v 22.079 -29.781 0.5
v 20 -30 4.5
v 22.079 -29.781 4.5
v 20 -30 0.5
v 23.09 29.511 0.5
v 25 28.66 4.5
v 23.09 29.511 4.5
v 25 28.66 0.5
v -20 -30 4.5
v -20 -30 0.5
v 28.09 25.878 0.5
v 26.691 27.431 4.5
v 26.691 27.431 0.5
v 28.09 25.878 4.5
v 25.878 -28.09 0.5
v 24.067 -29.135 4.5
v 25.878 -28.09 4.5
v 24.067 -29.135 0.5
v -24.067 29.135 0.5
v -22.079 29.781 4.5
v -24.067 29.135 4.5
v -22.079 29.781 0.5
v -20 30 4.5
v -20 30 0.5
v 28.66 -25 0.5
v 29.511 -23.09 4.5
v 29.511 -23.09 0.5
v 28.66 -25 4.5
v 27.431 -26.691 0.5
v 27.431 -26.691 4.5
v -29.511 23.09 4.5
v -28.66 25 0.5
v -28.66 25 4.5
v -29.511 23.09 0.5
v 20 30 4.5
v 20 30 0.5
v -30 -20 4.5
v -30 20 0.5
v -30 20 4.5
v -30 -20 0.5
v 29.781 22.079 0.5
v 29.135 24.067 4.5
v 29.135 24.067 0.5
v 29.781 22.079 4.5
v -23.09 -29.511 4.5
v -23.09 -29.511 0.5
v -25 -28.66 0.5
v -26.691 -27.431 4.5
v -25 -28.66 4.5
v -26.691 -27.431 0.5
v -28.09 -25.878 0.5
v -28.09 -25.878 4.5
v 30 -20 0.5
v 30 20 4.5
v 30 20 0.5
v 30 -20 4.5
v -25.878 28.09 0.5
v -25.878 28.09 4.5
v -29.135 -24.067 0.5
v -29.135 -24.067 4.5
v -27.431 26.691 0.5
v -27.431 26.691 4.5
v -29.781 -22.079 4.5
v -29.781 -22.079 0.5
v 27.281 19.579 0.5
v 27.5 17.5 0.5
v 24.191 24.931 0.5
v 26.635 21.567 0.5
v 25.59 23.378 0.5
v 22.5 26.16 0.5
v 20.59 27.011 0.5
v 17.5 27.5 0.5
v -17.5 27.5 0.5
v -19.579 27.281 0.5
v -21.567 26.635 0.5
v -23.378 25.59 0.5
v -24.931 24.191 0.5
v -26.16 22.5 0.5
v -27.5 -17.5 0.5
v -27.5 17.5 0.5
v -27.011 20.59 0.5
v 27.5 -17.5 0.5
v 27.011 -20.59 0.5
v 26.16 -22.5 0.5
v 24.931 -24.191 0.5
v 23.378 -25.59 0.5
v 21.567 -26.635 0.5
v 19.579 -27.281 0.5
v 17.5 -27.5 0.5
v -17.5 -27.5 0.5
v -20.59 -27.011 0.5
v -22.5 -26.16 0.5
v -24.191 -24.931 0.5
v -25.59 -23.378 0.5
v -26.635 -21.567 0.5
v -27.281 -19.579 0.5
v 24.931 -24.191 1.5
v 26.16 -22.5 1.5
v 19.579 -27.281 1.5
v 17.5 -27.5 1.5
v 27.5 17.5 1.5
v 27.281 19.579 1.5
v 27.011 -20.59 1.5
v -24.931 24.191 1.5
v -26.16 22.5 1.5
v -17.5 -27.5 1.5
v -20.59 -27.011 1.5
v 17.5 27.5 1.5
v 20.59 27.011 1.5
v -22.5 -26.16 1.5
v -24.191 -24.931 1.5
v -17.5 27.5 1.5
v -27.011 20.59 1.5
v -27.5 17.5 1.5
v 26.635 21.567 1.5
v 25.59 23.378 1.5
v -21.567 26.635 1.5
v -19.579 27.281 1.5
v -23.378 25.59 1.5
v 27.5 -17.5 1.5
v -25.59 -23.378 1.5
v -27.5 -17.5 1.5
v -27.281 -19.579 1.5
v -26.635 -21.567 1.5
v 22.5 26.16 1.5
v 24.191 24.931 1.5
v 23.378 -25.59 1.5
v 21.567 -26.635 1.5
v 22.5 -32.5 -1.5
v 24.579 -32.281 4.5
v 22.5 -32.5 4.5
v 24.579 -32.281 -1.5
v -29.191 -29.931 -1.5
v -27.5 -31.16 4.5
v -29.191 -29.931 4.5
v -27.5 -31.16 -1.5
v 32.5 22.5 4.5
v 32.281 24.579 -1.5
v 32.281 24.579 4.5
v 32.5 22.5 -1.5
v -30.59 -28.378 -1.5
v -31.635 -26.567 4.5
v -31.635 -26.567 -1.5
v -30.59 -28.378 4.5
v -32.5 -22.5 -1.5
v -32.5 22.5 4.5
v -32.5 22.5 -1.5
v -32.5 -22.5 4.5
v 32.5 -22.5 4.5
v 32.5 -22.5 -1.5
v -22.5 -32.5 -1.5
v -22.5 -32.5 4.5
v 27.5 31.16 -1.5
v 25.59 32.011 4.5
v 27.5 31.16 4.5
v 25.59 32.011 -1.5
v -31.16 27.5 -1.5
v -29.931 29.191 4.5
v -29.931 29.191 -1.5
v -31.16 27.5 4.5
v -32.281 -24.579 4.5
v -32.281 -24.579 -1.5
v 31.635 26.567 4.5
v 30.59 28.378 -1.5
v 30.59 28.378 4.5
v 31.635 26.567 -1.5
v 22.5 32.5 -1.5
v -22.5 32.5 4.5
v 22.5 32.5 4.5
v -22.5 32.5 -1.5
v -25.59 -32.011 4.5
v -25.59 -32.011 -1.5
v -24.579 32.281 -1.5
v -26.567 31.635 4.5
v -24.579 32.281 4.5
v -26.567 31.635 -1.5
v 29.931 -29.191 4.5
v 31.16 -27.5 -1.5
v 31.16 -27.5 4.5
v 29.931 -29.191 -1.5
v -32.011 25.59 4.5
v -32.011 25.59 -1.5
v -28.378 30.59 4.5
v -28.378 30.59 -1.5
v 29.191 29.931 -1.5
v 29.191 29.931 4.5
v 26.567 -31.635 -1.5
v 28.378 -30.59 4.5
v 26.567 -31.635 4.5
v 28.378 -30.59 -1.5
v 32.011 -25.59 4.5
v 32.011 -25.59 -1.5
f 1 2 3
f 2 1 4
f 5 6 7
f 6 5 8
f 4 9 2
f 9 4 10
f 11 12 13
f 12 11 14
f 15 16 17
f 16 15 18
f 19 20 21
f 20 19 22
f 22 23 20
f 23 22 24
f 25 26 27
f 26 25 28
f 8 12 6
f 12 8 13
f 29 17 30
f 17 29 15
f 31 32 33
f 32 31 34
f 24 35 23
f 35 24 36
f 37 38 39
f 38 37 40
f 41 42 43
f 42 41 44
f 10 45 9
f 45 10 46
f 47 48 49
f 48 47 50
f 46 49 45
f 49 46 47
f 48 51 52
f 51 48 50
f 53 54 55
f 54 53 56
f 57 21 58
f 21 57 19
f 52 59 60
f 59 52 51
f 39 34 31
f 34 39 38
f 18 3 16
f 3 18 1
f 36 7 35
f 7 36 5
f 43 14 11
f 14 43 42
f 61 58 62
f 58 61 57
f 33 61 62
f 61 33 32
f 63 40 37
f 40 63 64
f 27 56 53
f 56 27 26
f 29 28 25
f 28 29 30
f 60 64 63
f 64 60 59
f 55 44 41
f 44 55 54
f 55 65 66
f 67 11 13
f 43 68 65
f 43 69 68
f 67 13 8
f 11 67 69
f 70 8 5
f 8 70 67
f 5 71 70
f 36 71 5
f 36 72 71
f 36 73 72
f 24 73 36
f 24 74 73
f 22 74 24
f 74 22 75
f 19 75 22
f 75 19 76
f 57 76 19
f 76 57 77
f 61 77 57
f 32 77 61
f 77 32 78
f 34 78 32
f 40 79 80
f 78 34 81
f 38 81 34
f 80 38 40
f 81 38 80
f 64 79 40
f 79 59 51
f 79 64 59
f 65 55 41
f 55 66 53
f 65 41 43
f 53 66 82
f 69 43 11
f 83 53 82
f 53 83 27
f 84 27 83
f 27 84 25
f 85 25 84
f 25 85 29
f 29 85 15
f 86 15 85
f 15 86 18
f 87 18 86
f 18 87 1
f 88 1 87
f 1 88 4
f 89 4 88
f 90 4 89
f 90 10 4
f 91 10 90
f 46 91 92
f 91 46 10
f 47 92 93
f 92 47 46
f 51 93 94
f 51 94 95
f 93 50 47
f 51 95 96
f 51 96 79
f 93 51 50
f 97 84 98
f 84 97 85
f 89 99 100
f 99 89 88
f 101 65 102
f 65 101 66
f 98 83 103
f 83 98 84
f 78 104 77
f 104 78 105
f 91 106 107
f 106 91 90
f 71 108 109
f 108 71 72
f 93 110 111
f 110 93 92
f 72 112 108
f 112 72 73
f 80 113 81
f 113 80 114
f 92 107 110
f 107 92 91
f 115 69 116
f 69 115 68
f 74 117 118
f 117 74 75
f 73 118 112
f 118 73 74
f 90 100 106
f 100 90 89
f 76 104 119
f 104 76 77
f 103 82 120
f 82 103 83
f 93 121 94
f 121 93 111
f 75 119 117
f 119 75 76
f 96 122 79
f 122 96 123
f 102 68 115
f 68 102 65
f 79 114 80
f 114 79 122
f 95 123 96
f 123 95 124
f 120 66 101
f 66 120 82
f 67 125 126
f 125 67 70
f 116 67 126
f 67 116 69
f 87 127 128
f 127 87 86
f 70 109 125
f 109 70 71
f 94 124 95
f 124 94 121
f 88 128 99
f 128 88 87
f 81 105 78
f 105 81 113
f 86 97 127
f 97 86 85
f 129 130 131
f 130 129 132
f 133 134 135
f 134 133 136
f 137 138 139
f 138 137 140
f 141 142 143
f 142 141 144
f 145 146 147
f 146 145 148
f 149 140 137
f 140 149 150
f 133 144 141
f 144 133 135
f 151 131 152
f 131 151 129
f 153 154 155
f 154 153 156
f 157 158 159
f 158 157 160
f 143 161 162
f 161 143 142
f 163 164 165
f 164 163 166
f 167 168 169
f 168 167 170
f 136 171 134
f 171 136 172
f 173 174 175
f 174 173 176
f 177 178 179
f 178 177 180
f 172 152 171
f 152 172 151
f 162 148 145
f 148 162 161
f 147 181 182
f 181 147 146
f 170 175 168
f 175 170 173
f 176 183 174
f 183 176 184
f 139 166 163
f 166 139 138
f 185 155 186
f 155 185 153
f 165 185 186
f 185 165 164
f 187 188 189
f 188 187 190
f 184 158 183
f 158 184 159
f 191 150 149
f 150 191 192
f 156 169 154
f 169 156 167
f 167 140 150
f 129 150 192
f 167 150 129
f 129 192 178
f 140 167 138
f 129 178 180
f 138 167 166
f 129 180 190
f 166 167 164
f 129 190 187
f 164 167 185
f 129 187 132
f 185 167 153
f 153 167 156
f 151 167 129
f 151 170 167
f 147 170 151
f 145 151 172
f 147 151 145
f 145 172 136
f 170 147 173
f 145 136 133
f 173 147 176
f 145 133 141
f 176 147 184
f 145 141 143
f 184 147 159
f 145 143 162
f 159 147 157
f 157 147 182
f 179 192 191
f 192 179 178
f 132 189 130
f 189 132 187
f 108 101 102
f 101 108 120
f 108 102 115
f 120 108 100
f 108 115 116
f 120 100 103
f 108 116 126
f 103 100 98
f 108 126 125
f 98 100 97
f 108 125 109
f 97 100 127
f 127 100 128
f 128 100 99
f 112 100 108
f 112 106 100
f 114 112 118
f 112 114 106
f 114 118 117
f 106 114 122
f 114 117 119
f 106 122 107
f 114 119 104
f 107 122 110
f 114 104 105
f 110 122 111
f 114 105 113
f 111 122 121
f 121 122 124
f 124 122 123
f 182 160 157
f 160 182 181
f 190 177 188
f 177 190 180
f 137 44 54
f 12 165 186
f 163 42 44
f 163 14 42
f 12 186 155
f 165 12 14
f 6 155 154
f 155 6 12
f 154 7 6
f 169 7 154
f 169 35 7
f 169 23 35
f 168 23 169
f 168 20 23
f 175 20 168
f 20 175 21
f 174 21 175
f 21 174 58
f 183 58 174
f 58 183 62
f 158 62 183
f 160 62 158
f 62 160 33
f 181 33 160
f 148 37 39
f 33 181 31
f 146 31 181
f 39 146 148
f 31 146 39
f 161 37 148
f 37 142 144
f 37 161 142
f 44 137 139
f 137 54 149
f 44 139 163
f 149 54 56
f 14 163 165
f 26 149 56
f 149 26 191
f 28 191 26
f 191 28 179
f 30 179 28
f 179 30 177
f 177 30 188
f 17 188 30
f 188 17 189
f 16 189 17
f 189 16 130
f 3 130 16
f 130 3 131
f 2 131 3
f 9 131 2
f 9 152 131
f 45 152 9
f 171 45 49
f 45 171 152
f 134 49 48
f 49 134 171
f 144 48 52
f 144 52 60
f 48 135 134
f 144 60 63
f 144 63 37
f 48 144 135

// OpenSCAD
/*
 * Test for a stamp mold
 */
echo(version=version());

// Base plate
// ----------
plateWidth = 65;    // 50
plateLength = 65;   // 50
plateThickNess = 3;
cornerRadius = 10;

logo = "./images/go.away.small.png"; 
imgRatio = 1.5;
logox = 430 * imgRatio; 
logoy = 500 * imgRatio; 

module roundedRect(size, radius) {  
	linear_extrude(height=size.z, center=true) {
		offset(radius) offset(-radius) {
			square([size.x, size.y], center = true);
		}
	}
}

difference() {  
	union() {
		difference() {
			roundedRect([plateWidth, plateLength, plateThickNess], cornerRadius);
			translate([0, 0, 2]) {
				scale([.9 * plateWidth / logox, .9 * plateWidth / logoy, .02]) {
					color("white") {
						rotate([0, 0, -90]) {
							surface(file=logo, invert=true, center=true);
						}
					}
				}
        // the groove around the picture
        difference() {
          roundedRect([plateWidth -  5, plateLength -  5, plateThickNess], cornerRadius);
          roundedRect([plateWidth - 10, plateLength - 10, plateThickNess * 1.1], cornerRadius);
        }
			}
		}
		// The frame
		translate([0, 0, (plateThickNess / 1)]) {
			difference() {
				roundedRect([plateWidth, plateLength, plateThickNess], cornerRadius);
				roundedRect([plateWidth - 5, plateLength - 5, plateThickNess * 1.1], cornerRadius);
			}
		}
	}
}
